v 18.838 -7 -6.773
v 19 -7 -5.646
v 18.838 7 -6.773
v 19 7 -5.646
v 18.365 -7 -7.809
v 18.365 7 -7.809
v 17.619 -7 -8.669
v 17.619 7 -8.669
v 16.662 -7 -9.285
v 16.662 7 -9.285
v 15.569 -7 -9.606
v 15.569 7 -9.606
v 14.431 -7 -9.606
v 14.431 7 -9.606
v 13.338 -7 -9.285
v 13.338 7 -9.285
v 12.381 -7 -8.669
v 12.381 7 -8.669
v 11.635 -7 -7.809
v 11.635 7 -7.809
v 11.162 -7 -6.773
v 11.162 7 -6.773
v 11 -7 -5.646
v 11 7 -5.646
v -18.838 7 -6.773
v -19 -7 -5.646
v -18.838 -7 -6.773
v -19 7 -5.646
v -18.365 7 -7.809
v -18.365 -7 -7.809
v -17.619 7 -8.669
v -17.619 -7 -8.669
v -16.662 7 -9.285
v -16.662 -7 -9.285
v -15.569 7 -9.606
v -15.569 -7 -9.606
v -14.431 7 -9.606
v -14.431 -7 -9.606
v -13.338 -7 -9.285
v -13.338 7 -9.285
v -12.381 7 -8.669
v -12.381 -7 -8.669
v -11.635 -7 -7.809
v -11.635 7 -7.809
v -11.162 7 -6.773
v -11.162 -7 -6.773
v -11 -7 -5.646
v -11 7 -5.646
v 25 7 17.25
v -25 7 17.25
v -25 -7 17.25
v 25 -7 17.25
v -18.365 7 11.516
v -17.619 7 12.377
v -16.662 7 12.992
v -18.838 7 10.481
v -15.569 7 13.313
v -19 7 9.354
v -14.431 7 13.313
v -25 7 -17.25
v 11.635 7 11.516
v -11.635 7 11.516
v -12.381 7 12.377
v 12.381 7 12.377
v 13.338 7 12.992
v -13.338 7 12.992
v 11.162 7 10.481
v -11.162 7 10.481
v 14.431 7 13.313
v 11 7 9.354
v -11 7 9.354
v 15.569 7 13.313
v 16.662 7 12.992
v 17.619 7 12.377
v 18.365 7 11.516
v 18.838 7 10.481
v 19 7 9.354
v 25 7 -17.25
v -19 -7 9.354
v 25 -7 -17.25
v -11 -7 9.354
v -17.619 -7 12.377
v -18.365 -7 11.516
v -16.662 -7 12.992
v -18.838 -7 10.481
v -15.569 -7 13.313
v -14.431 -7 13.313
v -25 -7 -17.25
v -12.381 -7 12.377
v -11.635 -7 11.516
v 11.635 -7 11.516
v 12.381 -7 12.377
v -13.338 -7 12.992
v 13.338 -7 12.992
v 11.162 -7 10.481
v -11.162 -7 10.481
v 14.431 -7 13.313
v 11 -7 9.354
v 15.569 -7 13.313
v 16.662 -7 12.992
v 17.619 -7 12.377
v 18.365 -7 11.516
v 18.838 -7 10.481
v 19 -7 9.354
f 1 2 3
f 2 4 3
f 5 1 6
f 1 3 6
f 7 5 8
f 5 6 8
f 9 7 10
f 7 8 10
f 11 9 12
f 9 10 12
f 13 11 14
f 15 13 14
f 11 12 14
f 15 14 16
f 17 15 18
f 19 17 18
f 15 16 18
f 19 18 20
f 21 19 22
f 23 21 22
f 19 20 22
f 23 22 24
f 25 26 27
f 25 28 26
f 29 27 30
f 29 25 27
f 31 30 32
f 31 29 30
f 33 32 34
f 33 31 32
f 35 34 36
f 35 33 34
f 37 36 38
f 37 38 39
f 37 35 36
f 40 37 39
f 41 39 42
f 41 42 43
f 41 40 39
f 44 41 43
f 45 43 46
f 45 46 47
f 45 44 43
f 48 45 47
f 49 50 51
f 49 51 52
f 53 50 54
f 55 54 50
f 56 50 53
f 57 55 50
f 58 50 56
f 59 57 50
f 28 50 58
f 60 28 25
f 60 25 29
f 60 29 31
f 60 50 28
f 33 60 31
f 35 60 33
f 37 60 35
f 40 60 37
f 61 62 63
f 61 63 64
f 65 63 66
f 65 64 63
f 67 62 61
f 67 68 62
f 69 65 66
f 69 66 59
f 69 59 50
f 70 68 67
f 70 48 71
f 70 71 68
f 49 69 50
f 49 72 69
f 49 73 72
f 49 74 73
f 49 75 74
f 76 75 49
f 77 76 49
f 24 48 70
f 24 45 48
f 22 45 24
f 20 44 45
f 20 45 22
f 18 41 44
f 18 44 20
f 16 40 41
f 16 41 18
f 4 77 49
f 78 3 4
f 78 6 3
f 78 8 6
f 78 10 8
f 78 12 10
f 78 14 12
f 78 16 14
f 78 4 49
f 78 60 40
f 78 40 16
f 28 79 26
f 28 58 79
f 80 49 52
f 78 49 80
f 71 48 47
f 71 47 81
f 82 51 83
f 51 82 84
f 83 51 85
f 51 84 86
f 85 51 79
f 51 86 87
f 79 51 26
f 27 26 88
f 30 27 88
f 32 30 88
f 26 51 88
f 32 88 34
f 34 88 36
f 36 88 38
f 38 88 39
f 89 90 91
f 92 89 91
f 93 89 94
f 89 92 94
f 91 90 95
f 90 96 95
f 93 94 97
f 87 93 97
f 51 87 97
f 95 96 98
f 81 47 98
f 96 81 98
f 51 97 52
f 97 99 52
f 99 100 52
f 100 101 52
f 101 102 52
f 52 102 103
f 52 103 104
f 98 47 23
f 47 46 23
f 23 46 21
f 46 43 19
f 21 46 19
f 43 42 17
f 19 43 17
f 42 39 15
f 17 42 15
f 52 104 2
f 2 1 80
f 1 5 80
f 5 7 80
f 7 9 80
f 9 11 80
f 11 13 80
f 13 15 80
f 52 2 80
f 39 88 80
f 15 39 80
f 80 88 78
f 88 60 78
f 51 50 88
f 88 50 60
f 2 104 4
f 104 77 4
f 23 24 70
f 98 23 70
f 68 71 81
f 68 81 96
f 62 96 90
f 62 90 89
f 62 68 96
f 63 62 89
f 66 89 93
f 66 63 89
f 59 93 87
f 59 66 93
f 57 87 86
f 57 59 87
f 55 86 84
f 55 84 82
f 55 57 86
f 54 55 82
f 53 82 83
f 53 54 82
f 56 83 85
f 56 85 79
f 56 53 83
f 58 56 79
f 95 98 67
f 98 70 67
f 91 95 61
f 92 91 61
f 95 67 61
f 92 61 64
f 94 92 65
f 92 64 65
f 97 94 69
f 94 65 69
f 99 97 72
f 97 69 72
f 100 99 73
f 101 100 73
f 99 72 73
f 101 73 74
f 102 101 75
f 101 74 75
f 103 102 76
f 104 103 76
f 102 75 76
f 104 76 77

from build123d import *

# Parameters (mm, degrees)
SKETCH1_W           = 50
SKETCH1_H           = 34.5
BOSS_EXTRUDE1_DEPTH = 7


with BuildPart() as part:
    # Sketch1 → Boss-Extrude1 (new, symmetric)
    with BuildSketch(Plane(origin=(0, 0, 0), x_dir=(1, 0, 0), z_dir=(0, 1, 0))):
        Rectangle(SKETCH1_W, SKETCH1_H)
        with BuildLine():
            Line((-11, 5.646273024), (-11, -9.353726976))
            ThreePointArc((-11, -9.353726976), (-15, -13.353726976), (-19, -9.353726976))
            Line((-19, -9.353726976), (-19, 5.646273024))
            ThreePointArc((-19, 5.646273024), (-15, 9.646273024), (-11, 5.646273024))
        make_face(mode=Mode.SUBTRACT)
        with BuildLine():
            Line((11, 5.646273024), (11, -9.353726976))
            ThreePointArc((11, -9.353726976), (15, -13.353726976), (19, -9.353726976))
            Line((19, -9.353726976), (19, 5.646273024))
            ThreePointArc((19, 5.646273024), (15, 9.646273024), (11, 5.646273024))
        make_face(mode=Mode.SUBTRACT)
    extrude(amount=BOSS_EXTRUDE1_DEPTH, both=True)


solid = part.part
